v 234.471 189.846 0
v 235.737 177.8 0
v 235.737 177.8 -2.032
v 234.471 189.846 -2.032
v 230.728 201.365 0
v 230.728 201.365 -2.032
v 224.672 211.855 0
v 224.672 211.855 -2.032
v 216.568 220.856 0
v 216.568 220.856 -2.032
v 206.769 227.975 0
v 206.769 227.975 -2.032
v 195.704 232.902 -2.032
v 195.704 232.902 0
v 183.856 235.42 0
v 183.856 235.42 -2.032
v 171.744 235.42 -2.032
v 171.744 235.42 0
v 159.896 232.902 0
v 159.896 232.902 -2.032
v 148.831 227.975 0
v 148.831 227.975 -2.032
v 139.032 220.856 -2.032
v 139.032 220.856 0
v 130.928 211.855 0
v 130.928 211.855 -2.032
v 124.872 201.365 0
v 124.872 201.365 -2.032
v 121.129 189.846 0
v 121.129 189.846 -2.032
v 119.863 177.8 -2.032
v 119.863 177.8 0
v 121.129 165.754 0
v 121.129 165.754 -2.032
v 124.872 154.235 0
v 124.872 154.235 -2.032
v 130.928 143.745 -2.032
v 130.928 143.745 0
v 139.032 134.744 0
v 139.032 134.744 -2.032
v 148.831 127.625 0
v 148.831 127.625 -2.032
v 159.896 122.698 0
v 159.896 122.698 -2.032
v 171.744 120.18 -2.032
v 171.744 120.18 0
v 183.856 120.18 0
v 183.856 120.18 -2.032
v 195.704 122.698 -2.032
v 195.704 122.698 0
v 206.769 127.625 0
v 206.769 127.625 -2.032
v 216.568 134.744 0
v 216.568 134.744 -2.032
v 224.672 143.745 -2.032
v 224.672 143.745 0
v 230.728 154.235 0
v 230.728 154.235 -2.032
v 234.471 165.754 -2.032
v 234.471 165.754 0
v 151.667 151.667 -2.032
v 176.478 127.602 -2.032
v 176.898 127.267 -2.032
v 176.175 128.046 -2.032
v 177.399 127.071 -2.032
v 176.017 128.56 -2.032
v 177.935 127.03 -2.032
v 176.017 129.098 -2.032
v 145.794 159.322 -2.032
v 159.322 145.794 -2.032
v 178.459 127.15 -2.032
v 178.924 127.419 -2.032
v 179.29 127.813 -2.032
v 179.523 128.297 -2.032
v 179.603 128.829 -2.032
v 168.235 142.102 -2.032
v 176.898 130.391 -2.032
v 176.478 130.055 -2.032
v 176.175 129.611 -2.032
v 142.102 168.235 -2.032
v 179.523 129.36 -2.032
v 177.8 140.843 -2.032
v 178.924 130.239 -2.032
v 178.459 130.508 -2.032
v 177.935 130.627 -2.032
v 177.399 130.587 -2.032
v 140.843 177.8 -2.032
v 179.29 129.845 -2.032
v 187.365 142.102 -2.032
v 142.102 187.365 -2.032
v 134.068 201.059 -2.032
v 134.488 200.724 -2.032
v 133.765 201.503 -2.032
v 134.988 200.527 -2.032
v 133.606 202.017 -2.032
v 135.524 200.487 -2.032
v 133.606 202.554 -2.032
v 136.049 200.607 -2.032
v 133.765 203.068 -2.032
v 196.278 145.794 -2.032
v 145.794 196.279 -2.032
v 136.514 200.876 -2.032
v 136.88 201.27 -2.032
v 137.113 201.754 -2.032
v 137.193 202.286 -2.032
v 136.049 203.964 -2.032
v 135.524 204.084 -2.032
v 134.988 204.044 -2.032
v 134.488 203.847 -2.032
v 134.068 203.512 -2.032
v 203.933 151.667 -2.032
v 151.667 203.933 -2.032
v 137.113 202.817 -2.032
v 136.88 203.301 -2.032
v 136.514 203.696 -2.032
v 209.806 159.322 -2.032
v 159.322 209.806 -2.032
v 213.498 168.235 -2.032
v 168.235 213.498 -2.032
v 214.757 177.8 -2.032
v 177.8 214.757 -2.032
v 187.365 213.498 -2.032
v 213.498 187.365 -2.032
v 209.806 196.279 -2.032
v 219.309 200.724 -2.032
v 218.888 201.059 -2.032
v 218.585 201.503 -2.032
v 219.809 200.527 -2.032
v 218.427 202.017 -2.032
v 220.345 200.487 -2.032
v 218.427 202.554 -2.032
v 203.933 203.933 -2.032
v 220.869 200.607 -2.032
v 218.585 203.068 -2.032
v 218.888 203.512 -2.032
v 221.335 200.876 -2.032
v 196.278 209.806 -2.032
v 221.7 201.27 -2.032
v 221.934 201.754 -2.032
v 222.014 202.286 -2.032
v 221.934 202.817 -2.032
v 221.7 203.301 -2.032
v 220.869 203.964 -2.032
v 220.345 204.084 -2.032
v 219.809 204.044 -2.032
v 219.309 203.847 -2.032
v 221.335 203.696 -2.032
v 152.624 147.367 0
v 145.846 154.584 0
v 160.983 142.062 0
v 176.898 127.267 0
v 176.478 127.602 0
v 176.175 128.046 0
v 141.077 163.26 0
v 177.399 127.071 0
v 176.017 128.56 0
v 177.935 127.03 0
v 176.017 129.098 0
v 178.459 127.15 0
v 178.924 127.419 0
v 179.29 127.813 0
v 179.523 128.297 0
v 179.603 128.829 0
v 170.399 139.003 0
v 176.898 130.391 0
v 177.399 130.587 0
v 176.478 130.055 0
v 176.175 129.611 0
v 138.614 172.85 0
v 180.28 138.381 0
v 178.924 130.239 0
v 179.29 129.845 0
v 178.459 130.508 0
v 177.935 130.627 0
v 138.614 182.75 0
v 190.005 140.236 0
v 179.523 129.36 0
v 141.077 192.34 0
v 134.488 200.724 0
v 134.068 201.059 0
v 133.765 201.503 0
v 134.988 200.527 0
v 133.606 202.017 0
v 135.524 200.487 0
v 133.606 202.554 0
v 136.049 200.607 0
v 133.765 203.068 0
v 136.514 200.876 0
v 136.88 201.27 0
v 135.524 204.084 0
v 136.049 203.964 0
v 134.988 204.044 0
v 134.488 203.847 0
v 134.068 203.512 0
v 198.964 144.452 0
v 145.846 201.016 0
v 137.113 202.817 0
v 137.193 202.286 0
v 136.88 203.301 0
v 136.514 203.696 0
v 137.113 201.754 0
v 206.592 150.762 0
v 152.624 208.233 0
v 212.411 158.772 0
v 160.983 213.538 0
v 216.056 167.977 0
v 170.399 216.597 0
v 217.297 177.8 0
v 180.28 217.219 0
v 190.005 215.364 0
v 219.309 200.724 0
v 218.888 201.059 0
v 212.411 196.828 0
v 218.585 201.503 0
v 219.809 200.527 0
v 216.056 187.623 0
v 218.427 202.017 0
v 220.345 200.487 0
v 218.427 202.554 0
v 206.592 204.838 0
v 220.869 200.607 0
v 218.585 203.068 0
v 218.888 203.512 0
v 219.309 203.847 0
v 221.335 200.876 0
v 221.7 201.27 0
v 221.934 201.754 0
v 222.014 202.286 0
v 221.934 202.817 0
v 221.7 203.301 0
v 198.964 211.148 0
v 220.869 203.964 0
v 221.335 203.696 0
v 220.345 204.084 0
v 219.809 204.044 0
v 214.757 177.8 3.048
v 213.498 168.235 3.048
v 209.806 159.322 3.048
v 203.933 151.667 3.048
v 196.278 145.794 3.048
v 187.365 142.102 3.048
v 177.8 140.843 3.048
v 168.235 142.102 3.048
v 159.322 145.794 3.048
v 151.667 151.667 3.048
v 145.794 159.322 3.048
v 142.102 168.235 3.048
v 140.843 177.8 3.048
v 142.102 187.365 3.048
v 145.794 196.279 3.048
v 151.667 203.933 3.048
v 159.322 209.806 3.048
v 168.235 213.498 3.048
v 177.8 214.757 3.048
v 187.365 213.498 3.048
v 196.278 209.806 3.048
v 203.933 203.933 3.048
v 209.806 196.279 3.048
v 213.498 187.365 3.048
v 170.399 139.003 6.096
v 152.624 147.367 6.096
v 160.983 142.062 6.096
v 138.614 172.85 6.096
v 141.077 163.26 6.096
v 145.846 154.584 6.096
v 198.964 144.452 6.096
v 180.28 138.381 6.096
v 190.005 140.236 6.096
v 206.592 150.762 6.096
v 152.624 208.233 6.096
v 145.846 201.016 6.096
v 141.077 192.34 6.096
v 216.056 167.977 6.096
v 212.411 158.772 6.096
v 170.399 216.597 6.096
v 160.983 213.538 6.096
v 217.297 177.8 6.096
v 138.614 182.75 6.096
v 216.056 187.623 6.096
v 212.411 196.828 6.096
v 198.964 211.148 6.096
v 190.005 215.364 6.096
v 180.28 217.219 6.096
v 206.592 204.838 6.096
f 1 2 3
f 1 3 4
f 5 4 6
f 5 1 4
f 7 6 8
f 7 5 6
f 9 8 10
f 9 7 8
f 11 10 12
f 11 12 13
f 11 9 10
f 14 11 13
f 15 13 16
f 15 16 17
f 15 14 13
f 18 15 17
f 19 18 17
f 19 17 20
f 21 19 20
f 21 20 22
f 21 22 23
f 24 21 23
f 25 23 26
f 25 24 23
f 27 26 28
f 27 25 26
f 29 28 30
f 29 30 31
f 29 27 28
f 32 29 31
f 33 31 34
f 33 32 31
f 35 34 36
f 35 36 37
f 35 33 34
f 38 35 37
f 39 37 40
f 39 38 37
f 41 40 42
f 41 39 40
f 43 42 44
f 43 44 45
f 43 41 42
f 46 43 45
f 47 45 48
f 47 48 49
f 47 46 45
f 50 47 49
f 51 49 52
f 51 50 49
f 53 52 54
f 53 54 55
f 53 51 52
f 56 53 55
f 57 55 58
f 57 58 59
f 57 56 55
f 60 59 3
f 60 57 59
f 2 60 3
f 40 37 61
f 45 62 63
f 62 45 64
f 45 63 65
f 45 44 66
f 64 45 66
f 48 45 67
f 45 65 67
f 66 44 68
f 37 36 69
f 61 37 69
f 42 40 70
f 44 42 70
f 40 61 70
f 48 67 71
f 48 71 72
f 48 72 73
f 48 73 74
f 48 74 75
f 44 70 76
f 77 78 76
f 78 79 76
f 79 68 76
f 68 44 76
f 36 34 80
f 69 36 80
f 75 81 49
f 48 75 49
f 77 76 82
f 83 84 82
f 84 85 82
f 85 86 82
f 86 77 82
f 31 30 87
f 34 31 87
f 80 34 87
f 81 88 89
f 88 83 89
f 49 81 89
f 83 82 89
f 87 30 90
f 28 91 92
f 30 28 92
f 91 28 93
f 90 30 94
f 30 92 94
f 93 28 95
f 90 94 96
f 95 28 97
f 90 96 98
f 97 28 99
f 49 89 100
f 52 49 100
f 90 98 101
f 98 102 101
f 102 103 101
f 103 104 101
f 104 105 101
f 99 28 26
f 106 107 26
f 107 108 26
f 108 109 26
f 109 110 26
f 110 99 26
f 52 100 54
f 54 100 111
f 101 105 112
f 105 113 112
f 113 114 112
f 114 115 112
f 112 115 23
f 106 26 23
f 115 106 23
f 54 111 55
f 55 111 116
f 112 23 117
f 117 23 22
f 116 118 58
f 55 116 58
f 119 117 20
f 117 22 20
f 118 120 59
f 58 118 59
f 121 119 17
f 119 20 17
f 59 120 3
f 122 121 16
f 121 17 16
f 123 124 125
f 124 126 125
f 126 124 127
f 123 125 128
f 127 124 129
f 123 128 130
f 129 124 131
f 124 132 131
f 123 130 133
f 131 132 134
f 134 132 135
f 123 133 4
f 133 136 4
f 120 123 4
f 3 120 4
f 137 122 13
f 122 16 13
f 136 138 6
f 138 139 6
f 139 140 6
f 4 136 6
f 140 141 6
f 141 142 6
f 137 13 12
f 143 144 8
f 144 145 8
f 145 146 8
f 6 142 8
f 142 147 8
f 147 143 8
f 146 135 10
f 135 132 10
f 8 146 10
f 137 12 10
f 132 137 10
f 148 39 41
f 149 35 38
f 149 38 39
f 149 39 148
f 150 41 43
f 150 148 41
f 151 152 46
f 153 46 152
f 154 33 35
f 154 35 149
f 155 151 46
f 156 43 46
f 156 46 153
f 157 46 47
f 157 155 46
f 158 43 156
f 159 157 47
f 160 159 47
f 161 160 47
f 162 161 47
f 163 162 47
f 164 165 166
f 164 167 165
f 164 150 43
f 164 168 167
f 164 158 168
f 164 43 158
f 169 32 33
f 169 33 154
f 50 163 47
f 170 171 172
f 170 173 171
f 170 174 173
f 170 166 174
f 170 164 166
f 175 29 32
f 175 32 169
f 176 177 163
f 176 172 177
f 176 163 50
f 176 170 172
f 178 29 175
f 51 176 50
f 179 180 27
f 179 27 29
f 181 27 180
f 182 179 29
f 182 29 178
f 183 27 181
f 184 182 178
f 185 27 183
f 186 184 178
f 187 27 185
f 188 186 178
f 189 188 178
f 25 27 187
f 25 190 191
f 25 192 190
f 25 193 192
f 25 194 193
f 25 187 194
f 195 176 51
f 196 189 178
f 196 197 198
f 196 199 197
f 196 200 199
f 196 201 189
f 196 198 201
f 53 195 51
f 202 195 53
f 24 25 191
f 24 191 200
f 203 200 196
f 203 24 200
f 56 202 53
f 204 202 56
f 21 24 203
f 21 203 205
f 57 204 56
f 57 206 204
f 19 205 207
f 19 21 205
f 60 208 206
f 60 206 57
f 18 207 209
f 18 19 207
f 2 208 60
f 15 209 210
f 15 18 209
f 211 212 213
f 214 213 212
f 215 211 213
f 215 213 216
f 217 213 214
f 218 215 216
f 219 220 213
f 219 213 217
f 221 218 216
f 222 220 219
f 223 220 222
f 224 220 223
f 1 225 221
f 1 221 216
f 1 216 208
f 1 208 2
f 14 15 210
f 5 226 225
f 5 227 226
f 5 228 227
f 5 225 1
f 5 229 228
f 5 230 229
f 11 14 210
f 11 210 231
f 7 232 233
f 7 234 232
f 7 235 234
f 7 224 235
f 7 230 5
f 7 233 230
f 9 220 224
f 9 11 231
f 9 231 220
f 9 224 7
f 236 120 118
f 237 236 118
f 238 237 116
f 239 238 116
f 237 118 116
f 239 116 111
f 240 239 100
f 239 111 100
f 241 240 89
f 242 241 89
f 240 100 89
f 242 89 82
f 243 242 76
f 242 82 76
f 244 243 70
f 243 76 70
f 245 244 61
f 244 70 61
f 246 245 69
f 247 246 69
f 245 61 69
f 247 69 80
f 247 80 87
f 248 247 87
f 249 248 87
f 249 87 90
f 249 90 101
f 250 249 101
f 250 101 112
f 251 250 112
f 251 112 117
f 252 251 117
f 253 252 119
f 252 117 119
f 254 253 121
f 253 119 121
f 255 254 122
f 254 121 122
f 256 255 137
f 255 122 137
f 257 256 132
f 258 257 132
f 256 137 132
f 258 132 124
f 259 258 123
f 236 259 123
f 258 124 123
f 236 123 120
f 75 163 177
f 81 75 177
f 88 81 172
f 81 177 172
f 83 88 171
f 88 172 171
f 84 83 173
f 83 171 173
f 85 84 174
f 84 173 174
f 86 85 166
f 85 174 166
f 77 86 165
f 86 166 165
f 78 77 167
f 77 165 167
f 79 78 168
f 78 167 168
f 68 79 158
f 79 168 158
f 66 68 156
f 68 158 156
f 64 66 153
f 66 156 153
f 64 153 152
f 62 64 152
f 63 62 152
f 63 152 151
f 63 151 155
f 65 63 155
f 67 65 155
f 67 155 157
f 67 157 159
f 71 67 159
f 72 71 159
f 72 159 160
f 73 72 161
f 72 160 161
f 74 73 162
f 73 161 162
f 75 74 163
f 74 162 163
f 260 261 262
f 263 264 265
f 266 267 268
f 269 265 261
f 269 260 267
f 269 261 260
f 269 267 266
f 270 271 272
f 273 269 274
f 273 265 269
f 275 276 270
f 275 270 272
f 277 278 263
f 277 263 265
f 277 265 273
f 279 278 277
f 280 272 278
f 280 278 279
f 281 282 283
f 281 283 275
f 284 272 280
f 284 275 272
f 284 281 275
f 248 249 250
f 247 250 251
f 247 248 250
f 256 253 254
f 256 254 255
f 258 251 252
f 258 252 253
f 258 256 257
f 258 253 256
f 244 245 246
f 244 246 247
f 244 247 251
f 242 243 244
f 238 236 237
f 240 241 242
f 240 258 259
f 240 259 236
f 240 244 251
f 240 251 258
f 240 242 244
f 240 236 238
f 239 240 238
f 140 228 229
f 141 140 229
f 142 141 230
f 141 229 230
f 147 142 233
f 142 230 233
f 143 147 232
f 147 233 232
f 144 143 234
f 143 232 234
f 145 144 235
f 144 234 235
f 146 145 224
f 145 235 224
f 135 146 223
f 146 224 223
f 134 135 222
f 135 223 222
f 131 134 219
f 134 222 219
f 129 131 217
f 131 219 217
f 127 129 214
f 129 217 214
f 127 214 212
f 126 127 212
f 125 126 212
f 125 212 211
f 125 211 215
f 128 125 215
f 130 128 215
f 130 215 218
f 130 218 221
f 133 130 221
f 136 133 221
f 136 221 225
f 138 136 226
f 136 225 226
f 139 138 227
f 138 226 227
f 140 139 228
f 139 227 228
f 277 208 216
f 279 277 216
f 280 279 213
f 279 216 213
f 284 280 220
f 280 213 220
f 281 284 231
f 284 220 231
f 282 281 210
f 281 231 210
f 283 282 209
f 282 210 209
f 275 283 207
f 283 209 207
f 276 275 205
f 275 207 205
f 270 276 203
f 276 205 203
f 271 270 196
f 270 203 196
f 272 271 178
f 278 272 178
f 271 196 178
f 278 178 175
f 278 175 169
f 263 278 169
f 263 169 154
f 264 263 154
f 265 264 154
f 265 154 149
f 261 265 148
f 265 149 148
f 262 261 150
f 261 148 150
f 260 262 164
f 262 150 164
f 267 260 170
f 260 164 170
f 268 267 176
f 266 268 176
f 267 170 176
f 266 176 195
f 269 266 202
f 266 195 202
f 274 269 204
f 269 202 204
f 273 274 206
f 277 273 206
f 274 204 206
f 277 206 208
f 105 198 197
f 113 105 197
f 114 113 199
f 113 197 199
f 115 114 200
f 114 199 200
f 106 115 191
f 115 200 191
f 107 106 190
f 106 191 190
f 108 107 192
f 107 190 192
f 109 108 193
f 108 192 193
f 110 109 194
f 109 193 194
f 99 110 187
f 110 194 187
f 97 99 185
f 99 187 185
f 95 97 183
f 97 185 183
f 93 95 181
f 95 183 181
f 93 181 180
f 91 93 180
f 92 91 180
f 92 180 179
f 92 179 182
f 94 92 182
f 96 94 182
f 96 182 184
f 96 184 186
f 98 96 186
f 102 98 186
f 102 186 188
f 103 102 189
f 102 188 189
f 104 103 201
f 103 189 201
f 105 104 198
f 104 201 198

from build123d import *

# Parameters (mm, degrees)
SKETCH006_R   = 39.497
PAD001_DEPTH  = 6.096
SKETCH007_R   = 57.9374
SKETCH007_R_2 = 1.8034
PAD002_DEPTH  = 2.032
SKETCH009_R   = 36.957
POCKET_DEPTH  = 5.08


with BuildPart() as part:
    # Sketch006 → Pad001 (new body)
    with BuildSketch(Plane.XY):
        with Locations((177.8, 177.8)):
            Circle(SKETCH006_R)
    extrude(amount=PAD001_DEPTH)

    # Sketch007 → Pad002 (join)
    with BuildSketch(Plane.XY):
        with Locations((177.8, 177.8)):
            Circle(SKETCH007_R)
        with Locations((220.210303, 202.2856)):
            Circle(SKETCH007_R_2, mode=Mode.SUBTRACT)
        with Locations((135.389697, 202.2856)):
            Circle(SKETCH007_R_2, mode=Mode.SUBTRACT)
        with Locations((177.8, 128.8288)):
            Circle(SKETCH007_R_2, mode=Mode.SUBTRACT)
    extrude(amount=-PAD002_DEPTH)

    # Sketch009 (on Face3 of Pad002) → Pocket (cut)
    with BuildSketch(Plane(origin=(0, 0, -2.032), x_dir=(1, 0, 0), z_dir=(0, 0, -1))):
        with Locations((177.8, -177.8)):
            Circle(SKETCH009_R)
    extrude(amount=-POCKET_DEPTH, mode=Mode.SUBTRACT)


solid = part.part
